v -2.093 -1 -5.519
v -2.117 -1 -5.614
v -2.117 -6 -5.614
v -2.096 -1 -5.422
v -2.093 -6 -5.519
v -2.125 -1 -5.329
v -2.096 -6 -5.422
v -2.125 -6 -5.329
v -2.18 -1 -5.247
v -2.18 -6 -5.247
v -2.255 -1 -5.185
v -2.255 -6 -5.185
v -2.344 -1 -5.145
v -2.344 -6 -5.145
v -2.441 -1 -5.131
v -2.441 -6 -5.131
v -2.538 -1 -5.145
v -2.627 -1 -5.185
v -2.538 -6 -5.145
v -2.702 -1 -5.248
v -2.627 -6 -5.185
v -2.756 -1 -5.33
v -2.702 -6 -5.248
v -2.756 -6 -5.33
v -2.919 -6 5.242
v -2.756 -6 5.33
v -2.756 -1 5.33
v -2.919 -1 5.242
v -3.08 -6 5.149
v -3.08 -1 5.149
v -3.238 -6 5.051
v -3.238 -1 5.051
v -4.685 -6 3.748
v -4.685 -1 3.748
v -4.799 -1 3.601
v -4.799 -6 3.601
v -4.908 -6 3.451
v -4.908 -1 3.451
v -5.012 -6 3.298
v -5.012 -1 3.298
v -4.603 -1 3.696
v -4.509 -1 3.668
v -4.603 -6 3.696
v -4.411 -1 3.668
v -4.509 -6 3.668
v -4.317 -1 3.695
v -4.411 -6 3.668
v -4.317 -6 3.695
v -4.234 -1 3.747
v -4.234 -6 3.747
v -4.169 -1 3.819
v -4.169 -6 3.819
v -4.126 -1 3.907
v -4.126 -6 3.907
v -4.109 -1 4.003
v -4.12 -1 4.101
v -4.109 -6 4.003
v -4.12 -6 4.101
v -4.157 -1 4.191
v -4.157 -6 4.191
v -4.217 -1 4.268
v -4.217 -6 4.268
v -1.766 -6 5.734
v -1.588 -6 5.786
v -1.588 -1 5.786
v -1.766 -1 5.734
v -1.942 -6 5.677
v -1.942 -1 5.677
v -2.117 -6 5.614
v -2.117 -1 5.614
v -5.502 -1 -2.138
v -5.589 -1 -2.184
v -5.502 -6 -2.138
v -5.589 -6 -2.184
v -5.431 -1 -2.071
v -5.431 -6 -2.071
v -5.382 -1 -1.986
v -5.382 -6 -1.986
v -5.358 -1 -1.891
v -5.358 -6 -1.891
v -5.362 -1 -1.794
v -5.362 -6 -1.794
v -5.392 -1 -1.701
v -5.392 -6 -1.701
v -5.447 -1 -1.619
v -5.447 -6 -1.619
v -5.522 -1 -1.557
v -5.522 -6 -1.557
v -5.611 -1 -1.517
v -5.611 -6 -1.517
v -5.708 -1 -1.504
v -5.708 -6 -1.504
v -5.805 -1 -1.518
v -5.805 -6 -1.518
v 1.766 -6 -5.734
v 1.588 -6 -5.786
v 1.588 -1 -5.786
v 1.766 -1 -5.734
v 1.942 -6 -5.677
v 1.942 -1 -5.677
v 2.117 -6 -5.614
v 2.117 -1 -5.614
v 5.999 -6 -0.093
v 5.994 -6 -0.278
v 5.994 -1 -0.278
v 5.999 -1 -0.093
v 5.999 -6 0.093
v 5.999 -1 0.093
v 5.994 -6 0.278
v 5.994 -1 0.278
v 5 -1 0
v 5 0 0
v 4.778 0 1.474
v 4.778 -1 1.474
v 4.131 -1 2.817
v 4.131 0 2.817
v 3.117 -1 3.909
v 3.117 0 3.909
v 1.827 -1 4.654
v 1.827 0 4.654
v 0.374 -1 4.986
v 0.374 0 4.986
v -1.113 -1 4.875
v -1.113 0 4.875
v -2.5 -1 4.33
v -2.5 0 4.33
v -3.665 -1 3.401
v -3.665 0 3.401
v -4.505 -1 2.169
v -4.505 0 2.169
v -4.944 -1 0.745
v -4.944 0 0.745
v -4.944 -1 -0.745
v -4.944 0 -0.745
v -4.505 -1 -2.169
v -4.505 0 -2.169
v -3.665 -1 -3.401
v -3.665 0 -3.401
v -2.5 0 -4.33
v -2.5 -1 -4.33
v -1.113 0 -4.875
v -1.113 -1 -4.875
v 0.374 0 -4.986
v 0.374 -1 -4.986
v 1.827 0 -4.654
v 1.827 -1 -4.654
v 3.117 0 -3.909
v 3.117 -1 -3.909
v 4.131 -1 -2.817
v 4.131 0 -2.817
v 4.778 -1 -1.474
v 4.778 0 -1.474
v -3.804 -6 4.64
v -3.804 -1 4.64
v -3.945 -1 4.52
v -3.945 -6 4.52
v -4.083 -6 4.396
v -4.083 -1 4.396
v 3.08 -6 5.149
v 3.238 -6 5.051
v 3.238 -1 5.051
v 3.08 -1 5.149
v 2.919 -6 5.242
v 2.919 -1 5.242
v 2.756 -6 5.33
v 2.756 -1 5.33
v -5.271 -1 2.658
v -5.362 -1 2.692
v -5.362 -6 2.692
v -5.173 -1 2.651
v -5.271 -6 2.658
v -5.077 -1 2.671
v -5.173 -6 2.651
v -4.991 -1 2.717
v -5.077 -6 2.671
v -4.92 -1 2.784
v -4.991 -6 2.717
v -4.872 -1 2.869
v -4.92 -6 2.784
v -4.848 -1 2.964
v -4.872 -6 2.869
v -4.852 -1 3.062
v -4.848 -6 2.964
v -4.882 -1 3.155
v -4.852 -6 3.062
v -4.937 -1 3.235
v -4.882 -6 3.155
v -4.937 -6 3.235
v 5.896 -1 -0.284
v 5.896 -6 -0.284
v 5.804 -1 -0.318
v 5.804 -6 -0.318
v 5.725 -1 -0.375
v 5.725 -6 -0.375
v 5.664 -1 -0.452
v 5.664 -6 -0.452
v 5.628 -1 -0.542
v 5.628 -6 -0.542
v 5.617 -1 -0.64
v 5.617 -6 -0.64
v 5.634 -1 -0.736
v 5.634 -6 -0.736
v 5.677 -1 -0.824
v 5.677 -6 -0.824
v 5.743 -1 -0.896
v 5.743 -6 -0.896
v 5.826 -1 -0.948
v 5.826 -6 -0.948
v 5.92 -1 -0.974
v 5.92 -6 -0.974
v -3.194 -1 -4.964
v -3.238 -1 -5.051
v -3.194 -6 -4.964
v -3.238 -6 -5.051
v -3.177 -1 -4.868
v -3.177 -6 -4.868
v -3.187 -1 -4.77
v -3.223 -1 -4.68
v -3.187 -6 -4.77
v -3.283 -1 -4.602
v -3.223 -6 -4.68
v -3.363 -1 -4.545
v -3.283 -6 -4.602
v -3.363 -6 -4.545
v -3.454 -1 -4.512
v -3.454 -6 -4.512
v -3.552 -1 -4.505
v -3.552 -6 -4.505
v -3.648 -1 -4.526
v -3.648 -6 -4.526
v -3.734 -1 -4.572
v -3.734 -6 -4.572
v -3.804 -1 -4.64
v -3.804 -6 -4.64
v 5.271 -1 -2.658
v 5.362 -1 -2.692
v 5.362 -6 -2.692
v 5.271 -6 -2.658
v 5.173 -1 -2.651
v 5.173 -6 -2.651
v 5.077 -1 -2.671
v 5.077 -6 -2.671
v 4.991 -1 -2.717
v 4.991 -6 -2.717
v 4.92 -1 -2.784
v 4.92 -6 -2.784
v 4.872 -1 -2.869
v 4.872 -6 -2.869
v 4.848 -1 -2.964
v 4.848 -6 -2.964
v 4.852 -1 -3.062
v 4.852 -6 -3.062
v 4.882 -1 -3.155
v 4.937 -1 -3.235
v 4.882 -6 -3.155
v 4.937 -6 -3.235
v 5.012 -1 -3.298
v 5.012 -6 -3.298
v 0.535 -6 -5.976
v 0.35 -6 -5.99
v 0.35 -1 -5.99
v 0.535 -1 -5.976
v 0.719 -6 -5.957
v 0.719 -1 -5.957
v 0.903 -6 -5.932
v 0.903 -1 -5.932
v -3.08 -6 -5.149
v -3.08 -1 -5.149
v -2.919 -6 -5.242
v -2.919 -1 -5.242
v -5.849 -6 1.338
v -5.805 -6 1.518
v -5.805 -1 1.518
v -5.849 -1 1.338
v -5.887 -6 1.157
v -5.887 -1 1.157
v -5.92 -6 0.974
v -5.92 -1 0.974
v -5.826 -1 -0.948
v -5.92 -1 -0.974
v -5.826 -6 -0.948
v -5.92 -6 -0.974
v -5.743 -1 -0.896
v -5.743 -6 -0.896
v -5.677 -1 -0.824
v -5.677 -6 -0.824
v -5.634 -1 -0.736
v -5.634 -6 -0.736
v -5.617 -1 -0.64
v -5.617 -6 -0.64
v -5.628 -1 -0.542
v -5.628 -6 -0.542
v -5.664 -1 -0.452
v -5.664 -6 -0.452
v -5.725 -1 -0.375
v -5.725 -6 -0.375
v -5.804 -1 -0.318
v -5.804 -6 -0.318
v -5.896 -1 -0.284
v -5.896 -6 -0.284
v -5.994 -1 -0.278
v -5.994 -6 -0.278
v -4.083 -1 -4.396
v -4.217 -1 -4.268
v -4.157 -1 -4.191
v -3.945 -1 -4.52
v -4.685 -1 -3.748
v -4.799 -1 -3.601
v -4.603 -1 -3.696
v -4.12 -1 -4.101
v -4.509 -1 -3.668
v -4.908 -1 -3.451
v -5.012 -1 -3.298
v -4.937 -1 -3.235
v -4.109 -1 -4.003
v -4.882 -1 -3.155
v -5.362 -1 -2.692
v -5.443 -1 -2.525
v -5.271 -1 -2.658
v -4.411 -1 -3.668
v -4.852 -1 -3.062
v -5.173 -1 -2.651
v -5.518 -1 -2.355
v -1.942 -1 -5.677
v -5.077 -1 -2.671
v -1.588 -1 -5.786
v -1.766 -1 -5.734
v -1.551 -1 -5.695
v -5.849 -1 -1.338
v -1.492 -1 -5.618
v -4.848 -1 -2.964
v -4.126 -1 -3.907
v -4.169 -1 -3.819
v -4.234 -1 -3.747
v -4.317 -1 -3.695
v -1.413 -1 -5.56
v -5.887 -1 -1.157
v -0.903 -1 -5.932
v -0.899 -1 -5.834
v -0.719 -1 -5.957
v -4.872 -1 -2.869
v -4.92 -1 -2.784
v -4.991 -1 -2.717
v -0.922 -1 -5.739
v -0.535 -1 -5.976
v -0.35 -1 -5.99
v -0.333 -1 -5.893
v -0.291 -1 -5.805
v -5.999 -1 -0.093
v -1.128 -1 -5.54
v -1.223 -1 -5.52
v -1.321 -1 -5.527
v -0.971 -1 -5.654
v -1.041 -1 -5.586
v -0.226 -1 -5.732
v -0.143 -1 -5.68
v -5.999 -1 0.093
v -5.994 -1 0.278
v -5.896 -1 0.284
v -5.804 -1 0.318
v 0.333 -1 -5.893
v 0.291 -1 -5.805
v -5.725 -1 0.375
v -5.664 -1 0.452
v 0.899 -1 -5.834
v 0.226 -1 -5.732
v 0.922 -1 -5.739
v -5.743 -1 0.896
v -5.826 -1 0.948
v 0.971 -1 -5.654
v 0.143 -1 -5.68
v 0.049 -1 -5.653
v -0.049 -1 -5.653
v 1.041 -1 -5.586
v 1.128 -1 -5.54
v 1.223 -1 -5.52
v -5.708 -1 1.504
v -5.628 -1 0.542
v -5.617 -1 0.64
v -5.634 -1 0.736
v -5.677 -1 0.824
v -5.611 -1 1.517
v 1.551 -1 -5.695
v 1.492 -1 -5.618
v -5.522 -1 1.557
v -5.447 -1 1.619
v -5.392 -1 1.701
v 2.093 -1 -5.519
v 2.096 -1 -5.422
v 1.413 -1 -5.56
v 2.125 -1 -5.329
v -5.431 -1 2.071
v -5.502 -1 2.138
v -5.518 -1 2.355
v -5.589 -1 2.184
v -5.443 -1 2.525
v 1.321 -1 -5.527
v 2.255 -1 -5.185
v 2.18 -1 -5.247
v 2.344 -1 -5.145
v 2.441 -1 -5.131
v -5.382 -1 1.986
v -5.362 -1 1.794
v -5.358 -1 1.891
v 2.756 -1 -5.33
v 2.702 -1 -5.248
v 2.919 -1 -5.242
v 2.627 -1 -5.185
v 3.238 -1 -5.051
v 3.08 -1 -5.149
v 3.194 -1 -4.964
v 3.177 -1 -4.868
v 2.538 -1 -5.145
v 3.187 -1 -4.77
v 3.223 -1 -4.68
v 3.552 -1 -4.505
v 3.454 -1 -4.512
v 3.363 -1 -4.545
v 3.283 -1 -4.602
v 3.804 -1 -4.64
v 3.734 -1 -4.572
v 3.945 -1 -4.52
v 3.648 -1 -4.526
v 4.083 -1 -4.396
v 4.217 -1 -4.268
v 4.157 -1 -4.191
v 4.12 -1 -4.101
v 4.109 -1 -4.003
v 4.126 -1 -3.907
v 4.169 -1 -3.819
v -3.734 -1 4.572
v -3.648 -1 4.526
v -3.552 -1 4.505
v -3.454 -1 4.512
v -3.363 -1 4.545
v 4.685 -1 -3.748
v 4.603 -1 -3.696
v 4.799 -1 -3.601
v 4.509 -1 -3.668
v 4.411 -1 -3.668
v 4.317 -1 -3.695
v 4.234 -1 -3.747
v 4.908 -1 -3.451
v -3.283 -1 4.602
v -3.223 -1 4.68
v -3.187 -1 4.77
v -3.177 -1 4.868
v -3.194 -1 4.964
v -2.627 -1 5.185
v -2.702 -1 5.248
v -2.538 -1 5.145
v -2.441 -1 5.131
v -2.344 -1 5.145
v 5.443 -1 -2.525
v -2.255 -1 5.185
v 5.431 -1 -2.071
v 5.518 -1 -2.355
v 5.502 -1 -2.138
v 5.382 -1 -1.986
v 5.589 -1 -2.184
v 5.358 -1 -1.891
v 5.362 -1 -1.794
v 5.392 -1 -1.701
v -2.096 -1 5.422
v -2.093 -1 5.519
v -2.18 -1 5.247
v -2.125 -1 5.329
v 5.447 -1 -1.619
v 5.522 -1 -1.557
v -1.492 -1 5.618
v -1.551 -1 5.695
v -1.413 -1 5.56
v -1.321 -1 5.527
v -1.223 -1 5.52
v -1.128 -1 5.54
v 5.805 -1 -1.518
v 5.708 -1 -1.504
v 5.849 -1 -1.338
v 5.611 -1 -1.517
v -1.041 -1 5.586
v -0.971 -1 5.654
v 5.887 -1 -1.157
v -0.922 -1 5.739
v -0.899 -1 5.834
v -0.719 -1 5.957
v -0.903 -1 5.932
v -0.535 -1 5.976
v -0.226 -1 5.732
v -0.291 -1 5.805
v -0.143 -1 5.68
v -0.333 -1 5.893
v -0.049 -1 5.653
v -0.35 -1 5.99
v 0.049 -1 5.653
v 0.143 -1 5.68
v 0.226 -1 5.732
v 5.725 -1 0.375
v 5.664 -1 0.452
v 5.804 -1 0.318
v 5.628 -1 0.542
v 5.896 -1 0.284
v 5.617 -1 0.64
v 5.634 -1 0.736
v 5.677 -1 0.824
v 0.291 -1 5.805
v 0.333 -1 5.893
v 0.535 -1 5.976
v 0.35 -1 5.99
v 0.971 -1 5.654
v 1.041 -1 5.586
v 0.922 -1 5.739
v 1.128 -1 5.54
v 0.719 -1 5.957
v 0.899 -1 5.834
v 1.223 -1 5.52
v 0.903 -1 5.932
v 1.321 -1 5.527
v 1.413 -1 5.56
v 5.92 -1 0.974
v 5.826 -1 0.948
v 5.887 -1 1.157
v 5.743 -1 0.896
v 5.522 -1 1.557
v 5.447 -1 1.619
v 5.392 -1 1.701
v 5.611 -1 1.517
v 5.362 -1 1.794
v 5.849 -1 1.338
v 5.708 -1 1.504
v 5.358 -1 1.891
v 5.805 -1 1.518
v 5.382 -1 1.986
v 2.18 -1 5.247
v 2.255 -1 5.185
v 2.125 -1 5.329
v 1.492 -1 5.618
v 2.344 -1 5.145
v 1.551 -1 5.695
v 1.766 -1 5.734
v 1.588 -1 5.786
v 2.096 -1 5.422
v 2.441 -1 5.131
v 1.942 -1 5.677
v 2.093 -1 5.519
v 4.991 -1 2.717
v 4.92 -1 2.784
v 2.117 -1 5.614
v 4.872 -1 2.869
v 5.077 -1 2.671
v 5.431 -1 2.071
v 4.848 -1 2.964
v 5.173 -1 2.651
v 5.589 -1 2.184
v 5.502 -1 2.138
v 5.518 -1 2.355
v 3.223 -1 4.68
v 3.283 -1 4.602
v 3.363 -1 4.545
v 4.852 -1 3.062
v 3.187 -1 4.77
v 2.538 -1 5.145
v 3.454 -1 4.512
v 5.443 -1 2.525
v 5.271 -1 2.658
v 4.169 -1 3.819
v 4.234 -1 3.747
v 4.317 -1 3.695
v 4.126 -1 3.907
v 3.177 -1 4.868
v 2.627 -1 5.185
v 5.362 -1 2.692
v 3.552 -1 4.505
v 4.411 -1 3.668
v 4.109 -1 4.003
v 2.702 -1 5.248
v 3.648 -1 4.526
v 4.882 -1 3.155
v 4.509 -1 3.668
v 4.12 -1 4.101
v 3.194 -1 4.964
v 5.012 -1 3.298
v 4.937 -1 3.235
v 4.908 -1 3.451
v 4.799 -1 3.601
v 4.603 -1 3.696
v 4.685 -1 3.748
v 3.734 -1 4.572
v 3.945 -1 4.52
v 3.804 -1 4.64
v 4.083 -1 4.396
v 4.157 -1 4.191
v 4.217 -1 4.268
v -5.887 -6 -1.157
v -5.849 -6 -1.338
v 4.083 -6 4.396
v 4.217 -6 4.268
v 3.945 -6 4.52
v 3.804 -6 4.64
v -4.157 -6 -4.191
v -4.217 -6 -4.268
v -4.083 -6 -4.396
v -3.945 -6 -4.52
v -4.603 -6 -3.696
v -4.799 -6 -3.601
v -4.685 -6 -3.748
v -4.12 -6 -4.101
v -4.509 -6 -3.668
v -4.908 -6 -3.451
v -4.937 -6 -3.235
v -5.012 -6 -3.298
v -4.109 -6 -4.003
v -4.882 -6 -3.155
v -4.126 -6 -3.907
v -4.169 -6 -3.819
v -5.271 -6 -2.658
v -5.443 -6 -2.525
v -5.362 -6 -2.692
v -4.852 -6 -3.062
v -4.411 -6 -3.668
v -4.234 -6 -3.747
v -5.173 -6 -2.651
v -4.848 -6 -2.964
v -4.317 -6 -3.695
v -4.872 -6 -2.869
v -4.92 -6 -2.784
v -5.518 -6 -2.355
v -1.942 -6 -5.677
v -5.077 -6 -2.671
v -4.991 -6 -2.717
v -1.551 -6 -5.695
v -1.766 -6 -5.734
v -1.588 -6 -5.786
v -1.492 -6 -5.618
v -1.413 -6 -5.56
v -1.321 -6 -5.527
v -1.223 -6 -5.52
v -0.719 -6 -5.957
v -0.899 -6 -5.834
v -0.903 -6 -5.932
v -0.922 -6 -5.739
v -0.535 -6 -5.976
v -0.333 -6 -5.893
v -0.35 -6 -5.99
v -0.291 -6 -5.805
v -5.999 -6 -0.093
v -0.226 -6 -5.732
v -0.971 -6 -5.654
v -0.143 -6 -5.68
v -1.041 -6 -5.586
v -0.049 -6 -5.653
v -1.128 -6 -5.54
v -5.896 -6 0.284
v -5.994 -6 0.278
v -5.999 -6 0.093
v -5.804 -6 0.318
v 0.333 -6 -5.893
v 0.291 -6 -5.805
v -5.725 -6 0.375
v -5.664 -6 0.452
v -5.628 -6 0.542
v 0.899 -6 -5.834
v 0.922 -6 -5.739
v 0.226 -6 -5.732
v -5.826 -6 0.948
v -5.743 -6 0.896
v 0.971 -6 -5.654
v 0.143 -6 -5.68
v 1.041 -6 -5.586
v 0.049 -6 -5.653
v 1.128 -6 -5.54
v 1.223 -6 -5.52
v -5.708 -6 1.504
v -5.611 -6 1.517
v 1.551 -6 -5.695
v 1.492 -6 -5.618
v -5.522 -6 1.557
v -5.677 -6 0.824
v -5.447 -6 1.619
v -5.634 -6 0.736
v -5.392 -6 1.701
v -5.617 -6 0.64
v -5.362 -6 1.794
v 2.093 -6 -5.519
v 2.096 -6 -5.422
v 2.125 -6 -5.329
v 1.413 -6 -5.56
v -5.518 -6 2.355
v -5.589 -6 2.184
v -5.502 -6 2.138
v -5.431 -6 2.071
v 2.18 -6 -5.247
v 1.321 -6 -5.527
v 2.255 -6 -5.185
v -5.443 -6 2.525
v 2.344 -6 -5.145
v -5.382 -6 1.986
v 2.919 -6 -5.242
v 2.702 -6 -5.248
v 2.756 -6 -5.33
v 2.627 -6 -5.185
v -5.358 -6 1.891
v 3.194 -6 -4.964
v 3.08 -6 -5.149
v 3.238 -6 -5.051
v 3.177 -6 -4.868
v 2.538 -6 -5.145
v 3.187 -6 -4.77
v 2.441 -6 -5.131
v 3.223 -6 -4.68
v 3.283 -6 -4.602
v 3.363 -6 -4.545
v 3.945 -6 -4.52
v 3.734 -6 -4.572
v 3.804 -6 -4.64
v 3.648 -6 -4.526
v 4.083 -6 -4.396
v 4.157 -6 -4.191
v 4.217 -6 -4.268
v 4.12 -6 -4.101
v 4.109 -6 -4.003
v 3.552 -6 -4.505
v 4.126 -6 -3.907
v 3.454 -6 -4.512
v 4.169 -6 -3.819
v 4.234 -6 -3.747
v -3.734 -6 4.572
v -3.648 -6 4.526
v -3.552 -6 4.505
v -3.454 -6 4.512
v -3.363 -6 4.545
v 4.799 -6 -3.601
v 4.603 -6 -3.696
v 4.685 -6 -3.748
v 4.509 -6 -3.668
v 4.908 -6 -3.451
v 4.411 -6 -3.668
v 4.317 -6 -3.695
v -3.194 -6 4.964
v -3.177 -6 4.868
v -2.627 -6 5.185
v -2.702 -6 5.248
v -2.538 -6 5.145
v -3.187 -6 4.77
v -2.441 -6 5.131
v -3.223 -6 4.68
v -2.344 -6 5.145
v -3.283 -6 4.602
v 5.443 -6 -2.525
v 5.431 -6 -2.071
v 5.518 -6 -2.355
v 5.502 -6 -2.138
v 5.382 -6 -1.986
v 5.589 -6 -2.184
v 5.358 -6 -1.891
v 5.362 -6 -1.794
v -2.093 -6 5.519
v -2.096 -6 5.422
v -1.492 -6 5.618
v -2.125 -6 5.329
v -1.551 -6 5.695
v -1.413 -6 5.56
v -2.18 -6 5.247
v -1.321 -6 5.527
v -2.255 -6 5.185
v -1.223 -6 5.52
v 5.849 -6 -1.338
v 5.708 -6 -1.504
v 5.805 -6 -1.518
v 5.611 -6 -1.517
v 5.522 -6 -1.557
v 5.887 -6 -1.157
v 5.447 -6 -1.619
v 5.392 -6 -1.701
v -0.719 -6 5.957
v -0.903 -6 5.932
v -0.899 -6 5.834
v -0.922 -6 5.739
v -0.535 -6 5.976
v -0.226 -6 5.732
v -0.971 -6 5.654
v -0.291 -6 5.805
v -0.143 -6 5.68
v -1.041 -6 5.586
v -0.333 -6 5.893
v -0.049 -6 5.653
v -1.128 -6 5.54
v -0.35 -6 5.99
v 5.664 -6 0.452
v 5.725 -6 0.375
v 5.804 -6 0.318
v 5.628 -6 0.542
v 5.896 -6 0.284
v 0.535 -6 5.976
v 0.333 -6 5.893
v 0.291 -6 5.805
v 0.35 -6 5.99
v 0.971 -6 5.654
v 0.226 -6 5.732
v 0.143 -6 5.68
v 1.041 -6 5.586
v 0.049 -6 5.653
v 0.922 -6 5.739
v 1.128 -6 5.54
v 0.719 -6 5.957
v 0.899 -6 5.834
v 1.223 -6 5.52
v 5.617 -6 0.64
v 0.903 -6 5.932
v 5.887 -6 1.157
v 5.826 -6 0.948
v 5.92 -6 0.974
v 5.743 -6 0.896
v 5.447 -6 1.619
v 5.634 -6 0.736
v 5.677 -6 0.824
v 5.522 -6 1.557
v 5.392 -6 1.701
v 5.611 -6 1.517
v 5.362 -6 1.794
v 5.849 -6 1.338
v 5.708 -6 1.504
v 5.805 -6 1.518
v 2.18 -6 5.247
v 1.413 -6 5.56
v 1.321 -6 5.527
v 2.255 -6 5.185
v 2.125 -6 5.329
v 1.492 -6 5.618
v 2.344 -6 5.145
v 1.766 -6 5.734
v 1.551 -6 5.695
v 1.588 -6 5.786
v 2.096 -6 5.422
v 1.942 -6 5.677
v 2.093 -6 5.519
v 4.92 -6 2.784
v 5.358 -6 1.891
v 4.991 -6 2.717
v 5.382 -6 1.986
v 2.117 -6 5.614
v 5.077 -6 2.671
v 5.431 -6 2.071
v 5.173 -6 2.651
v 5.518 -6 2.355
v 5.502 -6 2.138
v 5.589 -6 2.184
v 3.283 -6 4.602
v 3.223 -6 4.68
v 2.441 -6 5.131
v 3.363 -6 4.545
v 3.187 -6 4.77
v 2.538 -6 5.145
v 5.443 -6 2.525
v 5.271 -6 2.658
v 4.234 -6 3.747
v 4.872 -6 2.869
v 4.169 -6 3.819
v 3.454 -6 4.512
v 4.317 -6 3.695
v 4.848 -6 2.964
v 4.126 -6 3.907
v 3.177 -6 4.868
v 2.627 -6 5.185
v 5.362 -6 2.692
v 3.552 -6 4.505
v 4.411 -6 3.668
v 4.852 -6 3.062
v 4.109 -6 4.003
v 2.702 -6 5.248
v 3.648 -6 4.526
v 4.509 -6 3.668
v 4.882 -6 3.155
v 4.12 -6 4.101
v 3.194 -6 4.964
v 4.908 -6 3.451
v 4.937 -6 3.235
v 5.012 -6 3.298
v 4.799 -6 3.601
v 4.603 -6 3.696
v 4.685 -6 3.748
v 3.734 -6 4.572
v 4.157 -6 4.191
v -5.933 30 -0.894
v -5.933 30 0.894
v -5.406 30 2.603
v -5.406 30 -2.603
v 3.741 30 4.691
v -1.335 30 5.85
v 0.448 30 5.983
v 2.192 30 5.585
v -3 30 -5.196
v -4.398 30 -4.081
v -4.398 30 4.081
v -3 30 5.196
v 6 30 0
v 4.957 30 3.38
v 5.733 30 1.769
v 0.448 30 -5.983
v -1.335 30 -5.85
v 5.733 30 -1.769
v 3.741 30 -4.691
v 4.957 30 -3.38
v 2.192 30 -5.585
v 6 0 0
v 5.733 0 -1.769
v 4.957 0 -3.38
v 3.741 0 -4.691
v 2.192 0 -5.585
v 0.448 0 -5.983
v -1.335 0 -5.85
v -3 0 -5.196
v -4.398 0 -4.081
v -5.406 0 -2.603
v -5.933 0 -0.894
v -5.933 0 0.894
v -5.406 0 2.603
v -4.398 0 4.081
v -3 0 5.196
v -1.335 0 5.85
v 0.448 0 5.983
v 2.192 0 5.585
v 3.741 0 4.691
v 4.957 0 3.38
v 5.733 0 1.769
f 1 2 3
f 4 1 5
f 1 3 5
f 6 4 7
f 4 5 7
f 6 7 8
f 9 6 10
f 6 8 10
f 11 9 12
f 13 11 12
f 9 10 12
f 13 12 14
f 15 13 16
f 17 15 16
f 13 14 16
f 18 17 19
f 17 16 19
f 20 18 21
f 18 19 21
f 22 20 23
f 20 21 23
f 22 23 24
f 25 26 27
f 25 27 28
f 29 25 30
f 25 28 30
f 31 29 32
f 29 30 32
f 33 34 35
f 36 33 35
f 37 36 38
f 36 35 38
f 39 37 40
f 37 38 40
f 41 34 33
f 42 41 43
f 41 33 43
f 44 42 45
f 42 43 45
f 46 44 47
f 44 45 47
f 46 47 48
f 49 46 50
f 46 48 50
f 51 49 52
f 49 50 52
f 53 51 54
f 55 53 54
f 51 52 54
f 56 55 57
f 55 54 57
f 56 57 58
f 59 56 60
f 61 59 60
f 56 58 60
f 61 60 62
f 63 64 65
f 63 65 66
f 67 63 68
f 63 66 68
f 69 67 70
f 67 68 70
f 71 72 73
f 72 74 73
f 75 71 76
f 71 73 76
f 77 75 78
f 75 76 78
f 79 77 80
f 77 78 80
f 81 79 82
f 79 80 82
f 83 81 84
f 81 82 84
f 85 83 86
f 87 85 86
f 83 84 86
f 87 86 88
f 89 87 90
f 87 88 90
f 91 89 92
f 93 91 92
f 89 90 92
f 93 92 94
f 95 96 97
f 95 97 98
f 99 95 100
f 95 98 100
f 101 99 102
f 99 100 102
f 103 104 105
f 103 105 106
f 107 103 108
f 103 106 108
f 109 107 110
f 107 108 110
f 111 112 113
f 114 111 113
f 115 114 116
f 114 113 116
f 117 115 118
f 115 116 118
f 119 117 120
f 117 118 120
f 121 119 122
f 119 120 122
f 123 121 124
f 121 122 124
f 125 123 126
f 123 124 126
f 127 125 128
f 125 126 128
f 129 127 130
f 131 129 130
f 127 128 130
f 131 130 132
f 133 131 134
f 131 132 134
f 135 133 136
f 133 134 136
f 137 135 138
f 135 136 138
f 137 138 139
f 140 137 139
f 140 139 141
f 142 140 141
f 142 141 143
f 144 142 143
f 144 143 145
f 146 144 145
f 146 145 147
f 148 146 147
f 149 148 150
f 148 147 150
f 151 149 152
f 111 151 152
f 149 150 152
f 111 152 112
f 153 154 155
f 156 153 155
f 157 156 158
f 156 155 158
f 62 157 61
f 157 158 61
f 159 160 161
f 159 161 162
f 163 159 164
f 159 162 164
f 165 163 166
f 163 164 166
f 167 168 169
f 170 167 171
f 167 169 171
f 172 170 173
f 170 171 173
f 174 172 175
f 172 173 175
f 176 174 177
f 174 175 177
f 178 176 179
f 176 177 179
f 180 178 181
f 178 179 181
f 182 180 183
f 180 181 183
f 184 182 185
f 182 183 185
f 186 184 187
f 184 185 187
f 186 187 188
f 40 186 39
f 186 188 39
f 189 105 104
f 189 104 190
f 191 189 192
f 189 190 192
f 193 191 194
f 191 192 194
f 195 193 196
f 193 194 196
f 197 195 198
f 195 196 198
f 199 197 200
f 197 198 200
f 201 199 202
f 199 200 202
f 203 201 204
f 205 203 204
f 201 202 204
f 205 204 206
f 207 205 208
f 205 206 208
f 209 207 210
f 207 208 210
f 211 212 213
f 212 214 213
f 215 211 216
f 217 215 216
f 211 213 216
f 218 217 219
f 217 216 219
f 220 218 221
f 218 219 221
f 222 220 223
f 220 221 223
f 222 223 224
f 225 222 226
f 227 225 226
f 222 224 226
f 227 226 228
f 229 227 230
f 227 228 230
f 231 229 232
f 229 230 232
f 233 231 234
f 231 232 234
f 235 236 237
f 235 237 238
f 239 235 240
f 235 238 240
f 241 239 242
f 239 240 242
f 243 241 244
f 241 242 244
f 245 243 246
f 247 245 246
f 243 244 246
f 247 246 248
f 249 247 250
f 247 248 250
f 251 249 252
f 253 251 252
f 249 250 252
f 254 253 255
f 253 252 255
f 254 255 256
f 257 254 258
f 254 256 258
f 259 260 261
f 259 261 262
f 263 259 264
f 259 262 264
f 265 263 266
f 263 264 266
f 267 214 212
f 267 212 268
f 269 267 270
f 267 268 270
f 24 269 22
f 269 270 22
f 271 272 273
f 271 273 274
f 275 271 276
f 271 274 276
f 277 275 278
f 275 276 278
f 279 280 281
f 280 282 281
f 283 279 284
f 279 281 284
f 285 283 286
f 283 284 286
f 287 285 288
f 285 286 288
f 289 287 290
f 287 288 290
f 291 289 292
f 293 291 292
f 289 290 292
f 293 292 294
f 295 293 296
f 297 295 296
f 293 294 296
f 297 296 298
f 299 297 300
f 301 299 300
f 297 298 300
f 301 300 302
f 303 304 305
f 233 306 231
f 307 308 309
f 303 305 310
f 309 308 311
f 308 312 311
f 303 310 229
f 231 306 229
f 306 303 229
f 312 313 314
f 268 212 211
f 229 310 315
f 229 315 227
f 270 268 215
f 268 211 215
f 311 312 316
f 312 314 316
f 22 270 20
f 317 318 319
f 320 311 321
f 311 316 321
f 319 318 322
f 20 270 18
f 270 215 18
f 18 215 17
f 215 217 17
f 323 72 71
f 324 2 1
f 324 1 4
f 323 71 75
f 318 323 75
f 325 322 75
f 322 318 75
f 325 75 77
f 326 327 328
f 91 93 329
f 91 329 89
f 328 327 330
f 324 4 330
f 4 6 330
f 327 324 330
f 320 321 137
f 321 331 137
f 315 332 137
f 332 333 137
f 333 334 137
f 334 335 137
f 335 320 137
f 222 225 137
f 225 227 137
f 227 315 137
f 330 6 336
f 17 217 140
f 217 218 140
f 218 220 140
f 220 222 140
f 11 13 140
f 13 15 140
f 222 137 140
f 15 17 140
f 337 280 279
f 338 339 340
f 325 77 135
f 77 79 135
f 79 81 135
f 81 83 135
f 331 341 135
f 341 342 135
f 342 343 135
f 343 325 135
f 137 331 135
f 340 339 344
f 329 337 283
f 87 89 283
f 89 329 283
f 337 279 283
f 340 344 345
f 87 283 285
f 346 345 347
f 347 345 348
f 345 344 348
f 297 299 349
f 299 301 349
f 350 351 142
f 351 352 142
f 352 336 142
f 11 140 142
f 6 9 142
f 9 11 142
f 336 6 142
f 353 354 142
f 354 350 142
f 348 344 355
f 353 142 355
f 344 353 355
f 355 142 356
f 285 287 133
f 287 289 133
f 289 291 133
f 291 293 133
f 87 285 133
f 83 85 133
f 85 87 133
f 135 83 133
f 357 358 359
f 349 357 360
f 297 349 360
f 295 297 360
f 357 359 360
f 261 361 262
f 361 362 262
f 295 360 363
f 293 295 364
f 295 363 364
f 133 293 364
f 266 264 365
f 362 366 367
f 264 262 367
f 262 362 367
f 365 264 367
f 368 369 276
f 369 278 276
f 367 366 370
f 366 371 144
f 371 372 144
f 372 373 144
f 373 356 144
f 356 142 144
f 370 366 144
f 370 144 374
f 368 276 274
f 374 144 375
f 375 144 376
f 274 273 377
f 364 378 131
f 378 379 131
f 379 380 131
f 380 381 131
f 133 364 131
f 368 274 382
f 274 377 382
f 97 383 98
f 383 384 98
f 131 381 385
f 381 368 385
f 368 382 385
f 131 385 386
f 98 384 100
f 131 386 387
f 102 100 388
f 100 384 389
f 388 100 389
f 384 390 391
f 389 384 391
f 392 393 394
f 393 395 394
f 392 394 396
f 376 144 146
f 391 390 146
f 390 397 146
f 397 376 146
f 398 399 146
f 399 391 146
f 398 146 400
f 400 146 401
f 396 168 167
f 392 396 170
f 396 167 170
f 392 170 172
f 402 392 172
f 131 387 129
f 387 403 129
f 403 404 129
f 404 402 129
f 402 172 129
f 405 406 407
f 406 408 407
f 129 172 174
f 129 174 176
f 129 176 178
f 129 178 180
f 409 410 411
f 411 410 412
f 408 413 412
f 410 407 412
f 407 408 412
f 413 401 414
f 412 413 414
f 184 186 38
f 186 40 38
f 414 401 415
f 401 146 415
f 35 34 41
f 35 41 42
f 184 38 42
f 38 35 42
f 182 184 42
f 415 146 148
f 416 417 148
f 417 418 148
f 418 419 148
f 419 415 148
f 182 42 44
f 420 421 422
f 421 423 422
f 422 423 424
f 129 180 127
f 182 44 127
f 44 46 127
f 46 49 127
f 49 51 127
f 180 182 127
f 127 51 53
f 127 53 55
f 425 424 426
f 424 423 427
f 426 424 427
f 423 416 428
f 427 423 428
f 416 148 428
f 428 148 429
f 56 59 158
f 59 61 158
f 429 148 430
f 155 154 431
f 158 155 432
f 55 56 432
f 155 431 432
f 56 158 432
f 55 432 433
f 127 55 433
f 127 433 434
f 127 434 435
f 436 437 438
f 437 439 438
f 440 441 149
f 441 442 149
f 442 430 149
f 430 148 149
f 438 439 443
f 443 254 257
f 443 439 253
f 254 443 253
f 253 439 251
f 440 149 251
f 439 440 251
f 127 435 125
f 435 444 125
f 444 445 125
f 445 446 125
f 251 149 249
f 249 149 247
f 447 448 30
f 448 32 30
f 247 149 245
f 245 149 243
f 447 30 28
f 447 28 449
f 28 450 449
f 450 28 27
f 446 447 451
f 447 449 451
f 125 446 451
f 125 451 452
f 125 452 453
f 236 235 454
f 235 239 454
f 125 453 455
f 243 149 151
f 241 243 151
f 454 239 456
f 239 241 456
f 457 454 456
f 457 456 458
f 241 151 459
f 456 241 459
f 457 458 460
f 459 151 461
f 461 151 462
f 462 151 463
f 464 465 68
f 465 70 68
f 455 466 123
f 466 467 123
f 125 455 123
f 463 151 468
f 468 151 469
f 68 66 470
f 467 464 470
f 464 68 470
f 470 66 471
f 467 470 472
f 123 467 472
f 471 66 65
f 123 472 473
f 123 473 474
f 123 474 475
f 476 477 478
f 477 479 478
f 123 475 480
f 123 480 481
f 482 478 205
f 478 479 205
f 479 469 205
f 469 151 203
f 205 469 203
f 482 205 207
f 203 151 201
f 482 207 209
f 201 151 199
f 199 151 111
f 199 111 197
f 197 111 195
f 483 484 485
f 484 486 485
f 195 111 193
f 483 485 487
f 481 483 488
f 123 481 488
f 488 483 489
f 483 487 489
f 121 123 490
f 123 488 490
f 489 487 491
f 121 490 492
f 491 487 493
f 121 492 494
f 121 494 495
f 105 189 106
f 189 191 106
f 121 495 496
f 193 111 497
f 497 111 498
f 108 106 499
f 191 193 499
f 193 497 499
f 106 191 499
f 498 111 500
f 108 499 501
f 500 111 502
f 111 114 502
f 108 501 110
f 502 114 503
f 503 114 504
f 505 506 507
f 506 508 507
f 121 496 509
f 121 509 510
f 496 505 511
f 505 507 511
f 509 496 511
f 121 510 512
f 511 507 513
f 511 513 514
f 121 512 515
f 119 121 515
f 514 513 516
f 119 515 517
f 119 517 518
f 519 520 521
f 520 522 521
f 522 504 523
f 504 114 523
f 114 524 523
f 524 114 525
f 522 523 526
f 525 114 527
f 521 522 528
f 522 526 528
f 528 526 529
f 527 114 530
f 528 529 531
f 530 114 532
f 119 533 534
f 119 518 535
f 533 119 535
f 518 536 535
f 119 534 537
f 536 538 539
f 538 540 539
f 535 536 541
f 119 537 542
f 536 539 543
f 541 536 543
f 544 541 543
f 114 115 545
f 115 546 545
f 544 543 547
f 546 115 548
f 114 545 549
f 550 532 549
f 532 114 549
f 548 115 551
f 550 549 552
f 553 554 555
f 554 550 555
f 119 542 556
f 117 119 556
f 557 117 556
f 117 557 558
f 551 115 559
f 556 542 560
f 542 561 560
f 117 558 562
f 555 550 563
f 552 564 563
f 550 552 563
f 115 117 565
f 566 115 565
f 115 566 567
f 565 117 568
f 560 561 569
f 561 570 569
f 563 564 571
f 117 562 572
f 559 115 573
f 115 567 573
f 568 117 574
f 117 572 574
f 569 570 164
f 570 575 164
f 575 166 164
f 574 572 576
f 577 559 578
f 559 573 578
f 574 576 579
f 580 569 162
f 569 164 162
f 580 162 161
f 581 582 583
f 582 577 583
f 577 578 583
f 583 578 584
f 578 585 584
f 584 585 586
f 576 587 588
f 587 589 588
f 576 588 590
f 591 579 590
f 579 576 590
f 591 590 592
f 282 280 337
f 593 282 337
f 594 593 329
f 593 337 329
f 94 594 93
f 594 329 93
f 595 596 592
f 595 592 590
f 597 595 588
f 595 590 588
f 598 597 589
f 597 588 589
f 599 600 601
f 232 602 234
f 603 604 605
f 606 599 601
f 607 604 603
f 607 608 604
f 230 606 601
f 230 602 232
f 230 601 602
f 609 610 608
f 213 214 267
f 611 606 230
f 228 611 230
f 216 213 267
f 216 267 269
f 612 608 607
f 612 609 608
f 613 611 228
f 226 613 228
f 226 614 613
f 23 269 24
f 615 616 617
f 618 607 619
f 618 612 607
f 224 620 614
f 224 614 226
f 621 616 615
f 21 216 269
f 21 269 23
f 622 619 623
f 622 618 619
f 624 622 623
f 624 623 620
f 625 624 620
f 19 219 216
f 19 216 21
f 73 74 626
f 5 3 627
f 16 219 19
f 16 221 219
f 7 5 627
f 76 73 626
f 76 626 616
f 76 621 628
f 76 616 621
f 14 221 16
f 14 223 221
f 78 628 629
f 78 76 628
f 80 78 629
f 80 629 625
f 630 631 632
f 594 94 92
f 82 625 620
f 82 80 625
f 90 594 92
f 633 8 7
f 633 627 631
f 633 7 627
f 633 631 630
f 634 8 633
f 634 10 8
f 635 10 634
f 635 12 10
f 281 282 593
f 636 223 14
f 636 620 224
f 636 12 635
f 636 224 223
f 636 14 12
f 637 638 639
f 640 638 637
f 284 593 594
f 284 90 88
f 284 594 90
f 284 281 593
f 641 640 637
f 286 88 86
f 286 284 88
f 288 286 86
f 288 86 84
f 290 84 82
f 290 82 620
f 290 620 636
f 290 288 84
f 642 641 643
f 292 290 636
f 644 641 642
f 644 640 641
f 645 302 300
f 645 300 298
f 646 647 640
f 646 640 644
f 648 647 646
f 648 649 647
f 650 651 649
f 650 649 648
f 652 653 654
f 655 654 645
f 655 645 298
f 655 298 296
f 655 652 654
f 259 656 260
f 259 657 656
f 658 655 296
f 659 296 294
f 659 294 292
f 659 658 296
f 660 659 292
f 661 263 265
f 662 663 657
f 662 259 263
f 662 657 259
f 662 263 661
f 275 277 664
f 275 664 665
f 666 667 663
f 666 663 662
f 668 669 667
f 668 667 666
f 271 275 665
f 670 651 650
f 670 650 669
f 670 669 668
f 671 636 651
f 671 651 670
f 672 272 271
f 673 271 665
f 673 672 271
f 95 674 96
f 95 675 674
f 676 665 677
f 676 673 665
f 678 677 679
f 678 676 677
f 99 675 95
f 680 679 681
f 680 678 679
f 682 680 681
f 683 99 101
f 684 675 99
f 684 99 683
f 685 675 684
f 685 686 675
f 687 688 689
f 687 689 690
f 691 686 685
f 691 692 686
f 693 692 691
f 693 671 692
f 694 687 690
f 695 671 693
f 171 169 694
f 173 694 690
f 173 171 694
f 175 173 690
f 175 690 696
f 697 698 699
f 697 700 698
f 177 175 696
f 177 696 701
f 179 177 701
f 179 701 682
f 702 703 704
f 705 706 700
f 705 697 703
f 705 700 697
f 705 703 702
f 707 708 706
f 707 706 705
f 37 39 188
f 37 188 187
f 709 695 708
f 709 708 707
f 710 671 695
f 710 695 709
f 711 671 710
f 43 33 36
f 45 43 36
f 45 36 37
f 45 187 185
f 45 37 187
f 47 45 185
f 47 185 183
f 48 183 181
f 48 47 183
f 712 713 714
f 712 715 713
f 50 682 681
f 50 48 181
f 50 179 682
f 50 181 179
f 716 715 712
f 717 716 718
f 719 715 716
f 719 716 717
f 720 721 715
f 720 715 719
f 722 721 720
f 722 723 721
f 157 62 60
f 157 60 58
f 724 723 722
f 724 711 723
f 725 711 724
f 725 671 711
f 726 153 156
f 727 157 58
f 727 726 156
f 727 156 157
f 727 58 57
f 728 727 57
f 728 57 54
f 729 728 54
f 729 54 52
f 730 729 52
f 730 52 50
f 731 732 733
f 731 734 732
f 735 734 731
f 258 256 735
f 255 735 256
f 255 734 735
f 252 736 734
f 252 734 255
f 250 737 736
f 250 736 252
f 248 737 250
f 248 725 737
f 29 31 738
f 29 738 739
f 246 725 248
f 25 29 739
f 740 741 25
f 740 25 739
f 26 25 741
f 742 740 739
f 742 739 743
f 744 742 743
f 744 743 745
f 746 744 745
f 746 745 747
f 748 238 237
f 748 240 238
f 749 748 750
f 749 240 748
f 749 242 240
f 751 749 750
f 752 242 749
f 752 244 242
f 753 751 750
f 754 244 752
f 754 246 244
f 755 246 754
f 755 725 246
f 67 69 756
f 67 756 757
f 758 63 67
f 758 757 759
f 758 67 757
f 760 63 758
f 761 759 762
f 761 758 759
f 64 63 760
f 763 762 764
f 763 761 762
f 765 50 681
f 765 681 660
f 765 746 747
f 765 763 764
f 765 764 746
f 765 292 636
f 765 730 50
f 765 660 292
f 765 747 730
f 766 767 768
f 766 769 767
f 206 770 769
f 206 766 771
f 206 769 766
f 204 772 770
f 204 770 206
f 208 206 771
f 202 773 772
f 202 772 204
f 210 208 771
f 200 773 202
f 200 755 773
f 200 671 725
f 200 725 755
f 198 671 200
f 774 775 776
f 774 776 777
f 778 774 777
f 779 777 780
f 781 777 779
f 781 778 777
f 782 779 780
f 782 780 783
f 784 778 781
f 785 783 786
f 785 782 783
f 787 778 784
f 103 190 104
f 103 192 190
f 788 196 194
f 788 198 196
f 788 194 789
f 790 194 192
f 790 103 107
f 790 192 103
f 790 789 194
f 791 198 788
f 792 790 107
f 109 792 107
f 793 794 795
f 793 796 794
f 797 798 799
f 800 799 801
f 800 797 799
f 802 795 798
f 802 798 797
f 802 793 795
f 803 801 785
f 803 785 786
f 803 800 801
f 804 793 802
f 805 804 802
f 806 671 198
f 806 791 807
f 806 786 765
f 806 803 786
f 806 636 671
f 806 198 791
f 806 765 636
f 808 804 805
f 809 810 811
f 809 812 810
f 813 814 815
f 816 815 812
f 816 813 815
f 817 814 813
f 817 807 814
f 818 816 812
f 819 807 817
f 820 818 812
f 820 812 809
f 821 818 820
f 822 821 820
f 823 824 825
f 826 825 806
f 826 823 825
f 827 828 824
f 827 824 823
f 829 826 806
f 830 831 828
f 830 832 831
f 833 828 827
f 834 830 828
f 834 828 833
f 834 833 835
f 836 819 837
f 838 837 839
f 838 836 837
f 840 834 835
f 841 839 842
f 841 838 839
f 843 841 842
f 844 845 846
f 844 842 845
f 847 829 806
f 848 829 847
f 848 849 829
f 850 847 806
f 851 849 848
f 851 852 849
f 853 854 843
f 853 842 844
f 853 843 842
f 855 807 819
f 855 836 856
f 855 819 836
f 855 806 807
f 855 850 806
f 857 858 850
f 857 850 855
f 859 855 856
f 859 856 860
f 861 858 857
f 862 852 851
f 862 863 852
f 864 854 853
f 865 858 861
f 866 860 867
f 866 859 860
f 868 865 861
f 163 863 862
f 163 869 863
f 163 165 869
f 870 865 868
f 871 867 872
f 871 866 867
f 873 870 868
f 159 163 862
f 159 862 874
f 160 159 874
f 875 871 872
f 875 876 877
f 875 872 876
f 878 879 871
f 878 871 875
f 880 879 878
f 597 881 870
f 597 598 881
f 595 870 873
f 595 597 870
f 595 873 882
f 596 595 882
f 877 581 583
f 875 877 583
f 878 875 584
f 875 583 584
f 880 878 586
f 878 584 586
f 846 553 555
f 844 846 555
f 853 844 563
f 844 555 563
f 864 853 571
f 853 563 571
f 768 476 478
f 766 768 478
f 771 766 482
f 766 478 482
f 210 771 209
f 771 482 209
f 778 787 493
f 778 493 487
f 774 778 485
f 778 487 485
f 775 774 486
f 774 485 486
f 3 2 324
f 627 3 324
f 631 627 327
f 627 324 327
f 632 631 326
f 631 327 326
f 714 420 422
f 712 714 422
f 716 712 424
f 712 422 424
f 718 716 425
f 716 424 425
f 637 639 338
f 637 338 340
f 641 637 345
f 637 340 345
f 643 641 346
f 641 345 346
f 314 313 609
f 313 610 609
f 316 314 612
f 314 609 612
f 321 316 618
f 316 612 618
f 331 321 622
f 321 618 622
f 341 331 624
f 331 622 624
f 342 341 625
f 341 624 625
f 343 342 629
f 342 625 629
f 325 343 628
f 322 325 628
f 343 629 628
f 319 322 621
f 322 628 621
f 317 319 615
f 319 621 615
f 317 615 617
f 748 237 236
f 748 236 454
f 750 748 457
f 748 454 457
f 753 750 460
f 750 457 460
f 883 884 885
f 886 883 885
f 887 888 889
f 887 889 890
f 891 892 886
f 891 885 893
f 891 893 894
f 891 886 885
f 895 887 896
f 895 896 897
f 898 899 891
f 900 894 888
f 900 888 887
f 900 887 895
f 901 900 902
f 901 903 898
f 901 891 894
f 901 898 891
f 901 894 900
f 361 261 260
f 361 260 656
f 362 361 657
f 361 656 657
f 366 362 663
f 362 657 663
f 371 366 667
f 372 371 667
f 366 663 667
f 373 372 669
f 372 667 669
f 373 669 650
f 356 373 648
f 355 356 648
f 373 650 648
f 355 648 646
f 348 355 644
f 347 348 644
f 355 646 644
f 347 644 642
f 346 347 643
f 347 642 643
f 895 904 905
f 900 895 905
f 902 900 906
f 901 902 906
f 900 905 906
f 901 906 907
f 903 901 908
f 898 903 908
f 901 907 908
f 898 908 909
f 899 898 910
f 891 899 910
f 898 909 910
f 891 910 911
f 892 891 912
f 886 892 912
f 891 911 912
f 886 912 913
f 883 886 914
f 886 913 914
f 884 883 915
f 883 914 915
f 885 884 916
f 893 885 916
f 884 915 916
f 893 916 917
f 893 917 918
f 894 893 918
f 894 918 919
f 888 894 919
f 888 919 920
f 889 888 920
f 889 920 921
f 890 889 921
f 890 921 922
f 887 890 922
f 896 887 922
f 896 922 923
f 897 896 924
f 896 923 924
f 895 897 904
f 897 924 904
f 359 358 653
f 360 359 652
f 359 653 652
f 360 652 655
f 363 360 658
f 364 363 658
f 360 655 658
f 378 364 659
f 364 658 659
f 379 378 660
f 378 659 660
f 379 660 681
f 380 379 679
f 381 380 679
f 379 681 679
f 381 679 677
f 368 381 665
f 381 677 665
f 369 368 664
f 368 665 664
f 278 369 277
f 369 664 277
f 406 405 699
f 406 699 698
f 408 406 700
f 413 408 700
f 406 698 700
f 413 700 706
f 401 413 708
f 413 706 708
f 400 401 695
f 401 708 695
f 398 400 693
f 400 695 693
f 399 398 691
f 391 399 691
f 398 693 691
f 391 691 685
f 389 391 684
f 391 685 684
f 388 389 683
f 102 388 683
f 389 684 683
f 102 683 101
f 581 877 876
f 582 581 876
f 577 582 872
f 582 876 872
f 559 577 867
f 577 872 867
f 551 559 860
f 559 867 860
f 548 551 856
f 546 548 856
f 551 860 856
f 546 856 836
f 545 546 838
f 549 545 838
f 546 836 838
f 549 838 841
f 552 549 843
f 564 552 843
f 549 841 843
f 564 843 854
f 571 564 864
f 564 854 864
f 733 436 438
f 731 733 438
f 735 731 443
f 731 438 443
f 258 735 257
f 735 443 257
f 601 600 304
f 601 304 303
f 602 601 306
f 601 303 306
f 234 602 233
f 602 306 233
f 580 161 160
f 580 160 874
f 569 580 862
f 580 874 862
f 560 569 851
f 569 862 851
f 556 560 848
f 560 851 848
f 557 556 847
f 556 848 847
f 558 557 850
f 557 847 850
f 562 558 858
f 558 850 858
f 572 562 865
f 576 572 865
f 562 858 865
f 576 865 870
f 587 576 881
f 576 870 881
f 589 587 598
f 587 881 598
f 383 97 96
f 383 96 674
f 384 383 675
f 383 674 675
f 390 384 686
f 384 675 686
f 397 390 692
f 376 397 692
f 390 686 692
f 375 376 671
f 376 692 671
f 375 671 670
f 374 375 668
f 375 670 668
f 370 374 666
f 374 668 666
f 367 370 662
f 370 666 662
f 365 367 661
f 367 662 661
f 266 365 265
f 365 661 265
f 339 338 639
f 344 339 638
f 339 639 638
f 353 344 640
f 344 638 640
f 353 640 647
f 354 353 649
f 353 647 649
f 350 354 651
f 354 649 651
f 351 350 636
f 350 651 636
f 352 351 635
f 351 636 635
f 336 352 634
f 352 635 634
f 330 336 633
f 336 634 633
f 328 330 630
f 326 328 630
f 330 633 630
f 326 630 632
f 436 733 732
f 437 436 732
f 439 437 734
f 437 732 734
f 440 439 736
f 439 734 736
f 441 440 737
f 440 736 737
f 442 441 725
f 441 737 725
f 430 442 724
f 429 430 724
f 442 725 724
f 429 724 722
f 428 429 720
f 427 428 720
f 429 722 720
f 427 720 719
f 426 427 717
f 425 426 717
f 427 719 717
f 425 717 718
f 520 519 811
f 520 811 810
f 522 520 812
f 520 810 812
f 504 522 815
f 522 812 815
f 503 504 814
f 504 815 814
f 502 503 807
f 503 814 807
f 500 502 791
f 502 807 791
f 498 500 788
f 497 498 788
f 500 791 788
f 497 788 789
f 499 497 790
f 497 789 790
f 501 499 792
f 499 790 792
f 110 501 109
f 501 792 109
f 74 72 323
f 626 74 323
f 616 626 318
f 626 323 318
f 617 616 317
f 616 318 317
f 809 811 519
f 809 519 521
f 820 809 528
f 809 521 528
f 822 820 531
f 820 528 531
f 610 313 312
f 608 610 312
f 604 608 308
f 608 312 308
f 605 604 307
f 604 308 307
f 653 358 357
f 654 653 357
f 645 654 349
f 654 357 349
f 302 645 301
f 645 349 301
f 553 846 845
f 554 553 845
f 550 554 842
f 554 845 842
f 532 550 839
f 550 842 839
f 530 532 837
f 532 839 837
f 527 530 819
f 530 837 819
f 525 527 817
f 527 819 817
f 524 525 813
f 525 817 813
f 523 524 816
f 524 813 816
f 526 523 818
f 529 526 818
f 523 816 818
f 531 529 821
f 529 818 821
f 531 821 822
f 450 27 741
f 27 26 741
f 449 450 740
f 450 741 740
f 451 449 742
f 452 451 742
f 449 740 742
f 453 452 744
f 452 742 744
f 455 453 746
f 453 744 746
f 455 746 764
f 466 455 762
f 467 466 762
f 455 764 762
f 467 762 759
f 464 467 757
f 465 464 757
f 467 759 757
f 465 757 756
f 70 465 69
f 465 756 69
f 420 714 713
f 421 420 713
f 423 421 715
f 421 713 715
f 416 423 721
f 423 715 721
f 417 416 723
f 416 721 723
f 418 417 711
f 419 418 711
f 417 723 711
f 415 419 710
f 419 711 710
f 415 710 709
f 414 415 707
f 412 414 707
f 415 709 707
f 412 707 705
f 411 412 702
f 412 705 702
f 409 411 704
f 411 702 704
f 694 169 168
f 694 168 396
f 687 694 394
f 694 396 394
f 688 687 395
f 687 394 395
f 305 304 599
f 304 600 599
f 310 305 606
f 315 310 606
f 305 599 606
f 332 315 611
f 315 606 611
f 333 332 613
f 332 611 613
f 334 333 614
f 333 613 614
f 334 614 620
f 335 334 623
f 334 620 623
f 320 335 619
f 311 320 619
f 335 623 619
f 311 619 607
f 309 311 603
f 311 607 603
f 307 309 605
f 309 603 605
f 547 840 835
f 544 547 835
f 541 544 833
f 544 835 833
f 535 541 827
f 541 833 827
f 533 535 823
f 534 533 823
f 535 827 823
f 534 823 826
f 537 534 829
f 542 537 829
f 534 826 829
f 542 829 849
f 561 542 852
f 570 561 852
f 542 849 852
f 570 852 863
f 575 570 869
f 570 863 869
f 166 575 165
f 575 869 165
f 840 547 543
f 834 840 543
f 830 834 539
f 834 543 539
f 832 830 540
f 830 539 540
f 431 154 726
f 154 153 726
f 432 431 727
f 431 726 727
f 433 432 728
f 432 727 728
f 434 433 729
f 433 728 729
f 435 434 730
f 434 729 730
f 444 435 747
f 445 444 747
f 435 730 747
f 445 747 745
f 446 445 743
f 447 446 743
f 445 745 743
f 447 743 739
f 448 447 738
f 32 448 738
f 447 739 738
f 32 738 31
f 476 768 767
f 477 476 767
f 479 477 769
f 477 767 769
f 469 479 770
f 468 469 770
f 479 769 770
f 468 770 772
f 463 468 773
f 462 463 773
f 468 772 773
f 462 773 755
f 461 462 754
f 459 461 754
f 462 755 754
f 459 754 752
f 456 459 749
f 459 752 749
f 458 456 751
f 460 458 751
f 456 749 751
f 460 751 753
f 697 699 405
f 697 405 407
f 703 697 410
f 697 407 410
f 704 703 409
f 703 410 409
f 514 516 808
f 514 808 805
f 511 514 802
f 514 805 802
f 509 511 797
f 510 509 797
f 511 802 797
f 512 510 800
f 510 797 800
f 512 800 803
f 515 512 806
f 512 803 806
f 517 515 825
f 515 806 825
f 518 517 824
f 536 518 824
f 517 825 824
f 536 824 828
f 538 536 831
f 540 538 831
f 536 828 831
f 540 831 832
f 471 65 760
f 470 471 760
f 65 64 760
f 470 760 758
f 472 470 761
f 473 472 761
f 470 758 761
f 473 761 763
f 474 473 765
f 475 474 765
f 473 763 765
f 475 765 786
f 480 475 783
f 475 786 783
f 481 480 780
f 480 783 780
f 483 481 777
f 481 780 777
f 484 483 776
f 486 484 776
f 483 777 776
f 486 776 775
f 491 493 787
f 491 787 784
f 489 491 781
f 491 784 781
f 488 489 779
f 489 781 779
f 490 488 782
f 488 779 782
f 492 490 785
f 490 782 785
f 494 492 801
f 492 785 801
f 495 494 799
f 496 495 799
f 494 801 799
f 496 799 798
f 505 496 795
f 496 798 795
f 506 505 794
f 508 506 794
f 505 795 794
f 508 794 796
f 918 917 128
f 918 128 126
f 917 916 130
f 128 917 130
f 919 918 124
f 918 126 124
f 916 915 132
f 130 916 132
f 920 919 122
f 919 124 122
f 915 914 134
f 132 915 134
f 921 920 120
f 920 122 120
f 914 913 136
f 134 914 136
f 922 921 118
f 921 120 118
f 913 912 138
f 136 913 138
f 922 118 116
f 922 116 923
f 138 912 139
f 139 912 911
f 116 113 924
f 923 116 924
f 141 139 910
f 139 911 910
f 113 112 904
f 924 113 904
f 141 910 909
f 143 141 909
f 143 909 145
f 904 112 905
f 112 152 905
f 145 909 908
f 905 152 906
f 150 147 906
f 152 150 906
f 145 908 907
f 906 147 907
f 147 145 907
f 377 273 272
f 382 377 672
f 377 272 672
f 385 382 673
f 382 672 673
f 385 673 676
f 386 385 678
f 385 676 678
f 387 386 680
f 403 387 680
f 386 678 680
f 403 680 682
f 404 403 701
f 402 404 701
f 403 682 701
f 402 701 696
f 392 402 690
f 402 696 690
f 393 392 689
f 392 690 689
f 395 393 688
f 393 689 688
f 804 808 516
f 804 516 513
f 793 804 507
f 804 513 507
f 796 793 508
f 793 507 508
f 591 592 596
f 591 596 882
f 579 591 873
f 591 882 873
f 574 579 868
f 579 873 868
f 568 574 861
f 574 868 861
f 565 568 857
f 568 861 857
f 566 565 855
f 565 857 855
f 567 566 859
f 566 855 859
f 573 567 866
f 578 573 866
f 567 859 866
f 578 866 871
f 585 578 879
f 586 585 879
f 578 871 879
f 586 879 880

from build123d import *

# Parameters (mm, degrees)
CROQUIS1_R              = 6
SALIENTE_EXTRUIR1_DEPTH = 30
CROQUIS3_R              = 5
SALIENTE_EXTRUIR2_DEPTH = 1
CROQUIS4_R              = 6
SALIENTE_EXTRUIR3_DEPTH = 5
CROQUIS5_R              = 0.35
CORTAR_EXTRUIR1_DEPTH   = 5


with BuildPart() as part:
    # Croquis1 → Saliente-Extruir1 (new body)
    with BuildSketch(Plane(origin=(0, 0, 0), x_dir=(1, 0, 0), z_dir=(0, 1, 0))):
        Circle(CROQUIS1_R)
    extrude(amount=SALIENTE_EXTRUIR1_DEPTH)

    # Croquis3 → Saliente-Extruir2 (add)
    with BuildSketch(Plane.XZ):
        Circle(CROQUIS3_R)
    extrude(amount=SALIENTE_EXTRUIR2_DEPTH)

    # Croquis4 → Saliente-Extruir3 (add)
    with BuildSketch(Plane.XZ.offset(1)):
        Circle(CROQUIS4_R)
    extrude(amount=SALIENTE_EXTRUIR3_DEPTH)

    # Croquis5 → Cortar-Extruir1 (cut)
    with BuildSketch(Plane.XZ.offset(6)):
        with Locations((0, 6)):
            Circle(CROQUIS5_R)
        with Locations((1.247470145, 5.868885604)):
            Circle(CROQUIS5_R)
        with Locations((2.440419858, 5.481272746)):
            Circle(CROQUIS5_R)
        with Locations((3.526711514, 4.854101966)):
            Circle(CROQUIS5_R)
        with Locations((4.458868953, 4.014783638)):
            Circle(CROQUIS5_R)
        with Locations((5.196152423, 3)):
            Circle(CROQUIS5_R)
        with Locations((5.706339098, 1.854101966)):
            Circle(CROQUIS5_R)
        with Locations((5.967131372, 0.62717078)):
            Circle(CROQUIS5_R)
        with Locations((5.967131372, -0.62717078)):
            Circle(CROQUIS5_R)
        with Locations((5.706339098, -1.854101966)):
            Circle(CROQUIS5_R)
        with Locations((5.196152423, -3)):
            Circle(CROQUIS5_R)
        with Locations((4.458868953, -4.014783638)):
            Circle(CROQUIS5_R)
        with Locations((3.526711514, -4.854101966)):
            Circle(CROQUIS5_R)
        with Locations((2.440419858, -5.481272746)):
            Circle(CROQUIS5_R)
        with Locations((1.247470145, -5.868885604)):
            Circle(CROQUIS5_R)
        with Locations((0, -6)):
            Circle(CROQUIS5_R)
        with Locations((-1.247470145, -5.868885604)):
            Circle(CROQUIS5_R)
        with Locations((-2.440419858, -5.481272746)):
            Circle(CROQUIS5_R)
        with Locations((-3.526711514, -4.854101966)):
            Circle(CROQUIS5_R)
        with Locations((-4.458868953, -4.014783638)):
            Circle(CROQUIS5_R)
        with Locations((-5.196152423, -3)):
            Circle(CROQUIS5_R)
        with Locations((-5.706339098, -1.854101966)):
            Circle(CROQUIS5_R)
        with Locations((-5.967131372, -0.62717078)):
            Circle(CROQUIS5_R)
        with Locations((-5.967131372, 0.62717078)):
            Circle(CROQUIS5_R)
        with Locations((-5.706339098, 1.854101966)):
            Circle(CROQUIS5_R)
        with Locations((-5.196152423, 3)):
            Circle(CROQUIS5_R)
        with Locations((-4.458868953, 4.014783638)):
            Circle(CROQUIS5_R)
        with Locations((-3.526711514, 4.854101966)):
            Circle(CROQUIS5_R)
        with Locations((-2.440419858, 5.481272746)):
            Circle(CROQUIS5_R)
        with Locations((-1.247470145, 5.868885604)):
            Circle(CROQUIS5_R)
    extrude(amount=-CORTAR_EXTRUIR1_DEPTH, mode=Mode.SUBTRACT)


solid = part.part
